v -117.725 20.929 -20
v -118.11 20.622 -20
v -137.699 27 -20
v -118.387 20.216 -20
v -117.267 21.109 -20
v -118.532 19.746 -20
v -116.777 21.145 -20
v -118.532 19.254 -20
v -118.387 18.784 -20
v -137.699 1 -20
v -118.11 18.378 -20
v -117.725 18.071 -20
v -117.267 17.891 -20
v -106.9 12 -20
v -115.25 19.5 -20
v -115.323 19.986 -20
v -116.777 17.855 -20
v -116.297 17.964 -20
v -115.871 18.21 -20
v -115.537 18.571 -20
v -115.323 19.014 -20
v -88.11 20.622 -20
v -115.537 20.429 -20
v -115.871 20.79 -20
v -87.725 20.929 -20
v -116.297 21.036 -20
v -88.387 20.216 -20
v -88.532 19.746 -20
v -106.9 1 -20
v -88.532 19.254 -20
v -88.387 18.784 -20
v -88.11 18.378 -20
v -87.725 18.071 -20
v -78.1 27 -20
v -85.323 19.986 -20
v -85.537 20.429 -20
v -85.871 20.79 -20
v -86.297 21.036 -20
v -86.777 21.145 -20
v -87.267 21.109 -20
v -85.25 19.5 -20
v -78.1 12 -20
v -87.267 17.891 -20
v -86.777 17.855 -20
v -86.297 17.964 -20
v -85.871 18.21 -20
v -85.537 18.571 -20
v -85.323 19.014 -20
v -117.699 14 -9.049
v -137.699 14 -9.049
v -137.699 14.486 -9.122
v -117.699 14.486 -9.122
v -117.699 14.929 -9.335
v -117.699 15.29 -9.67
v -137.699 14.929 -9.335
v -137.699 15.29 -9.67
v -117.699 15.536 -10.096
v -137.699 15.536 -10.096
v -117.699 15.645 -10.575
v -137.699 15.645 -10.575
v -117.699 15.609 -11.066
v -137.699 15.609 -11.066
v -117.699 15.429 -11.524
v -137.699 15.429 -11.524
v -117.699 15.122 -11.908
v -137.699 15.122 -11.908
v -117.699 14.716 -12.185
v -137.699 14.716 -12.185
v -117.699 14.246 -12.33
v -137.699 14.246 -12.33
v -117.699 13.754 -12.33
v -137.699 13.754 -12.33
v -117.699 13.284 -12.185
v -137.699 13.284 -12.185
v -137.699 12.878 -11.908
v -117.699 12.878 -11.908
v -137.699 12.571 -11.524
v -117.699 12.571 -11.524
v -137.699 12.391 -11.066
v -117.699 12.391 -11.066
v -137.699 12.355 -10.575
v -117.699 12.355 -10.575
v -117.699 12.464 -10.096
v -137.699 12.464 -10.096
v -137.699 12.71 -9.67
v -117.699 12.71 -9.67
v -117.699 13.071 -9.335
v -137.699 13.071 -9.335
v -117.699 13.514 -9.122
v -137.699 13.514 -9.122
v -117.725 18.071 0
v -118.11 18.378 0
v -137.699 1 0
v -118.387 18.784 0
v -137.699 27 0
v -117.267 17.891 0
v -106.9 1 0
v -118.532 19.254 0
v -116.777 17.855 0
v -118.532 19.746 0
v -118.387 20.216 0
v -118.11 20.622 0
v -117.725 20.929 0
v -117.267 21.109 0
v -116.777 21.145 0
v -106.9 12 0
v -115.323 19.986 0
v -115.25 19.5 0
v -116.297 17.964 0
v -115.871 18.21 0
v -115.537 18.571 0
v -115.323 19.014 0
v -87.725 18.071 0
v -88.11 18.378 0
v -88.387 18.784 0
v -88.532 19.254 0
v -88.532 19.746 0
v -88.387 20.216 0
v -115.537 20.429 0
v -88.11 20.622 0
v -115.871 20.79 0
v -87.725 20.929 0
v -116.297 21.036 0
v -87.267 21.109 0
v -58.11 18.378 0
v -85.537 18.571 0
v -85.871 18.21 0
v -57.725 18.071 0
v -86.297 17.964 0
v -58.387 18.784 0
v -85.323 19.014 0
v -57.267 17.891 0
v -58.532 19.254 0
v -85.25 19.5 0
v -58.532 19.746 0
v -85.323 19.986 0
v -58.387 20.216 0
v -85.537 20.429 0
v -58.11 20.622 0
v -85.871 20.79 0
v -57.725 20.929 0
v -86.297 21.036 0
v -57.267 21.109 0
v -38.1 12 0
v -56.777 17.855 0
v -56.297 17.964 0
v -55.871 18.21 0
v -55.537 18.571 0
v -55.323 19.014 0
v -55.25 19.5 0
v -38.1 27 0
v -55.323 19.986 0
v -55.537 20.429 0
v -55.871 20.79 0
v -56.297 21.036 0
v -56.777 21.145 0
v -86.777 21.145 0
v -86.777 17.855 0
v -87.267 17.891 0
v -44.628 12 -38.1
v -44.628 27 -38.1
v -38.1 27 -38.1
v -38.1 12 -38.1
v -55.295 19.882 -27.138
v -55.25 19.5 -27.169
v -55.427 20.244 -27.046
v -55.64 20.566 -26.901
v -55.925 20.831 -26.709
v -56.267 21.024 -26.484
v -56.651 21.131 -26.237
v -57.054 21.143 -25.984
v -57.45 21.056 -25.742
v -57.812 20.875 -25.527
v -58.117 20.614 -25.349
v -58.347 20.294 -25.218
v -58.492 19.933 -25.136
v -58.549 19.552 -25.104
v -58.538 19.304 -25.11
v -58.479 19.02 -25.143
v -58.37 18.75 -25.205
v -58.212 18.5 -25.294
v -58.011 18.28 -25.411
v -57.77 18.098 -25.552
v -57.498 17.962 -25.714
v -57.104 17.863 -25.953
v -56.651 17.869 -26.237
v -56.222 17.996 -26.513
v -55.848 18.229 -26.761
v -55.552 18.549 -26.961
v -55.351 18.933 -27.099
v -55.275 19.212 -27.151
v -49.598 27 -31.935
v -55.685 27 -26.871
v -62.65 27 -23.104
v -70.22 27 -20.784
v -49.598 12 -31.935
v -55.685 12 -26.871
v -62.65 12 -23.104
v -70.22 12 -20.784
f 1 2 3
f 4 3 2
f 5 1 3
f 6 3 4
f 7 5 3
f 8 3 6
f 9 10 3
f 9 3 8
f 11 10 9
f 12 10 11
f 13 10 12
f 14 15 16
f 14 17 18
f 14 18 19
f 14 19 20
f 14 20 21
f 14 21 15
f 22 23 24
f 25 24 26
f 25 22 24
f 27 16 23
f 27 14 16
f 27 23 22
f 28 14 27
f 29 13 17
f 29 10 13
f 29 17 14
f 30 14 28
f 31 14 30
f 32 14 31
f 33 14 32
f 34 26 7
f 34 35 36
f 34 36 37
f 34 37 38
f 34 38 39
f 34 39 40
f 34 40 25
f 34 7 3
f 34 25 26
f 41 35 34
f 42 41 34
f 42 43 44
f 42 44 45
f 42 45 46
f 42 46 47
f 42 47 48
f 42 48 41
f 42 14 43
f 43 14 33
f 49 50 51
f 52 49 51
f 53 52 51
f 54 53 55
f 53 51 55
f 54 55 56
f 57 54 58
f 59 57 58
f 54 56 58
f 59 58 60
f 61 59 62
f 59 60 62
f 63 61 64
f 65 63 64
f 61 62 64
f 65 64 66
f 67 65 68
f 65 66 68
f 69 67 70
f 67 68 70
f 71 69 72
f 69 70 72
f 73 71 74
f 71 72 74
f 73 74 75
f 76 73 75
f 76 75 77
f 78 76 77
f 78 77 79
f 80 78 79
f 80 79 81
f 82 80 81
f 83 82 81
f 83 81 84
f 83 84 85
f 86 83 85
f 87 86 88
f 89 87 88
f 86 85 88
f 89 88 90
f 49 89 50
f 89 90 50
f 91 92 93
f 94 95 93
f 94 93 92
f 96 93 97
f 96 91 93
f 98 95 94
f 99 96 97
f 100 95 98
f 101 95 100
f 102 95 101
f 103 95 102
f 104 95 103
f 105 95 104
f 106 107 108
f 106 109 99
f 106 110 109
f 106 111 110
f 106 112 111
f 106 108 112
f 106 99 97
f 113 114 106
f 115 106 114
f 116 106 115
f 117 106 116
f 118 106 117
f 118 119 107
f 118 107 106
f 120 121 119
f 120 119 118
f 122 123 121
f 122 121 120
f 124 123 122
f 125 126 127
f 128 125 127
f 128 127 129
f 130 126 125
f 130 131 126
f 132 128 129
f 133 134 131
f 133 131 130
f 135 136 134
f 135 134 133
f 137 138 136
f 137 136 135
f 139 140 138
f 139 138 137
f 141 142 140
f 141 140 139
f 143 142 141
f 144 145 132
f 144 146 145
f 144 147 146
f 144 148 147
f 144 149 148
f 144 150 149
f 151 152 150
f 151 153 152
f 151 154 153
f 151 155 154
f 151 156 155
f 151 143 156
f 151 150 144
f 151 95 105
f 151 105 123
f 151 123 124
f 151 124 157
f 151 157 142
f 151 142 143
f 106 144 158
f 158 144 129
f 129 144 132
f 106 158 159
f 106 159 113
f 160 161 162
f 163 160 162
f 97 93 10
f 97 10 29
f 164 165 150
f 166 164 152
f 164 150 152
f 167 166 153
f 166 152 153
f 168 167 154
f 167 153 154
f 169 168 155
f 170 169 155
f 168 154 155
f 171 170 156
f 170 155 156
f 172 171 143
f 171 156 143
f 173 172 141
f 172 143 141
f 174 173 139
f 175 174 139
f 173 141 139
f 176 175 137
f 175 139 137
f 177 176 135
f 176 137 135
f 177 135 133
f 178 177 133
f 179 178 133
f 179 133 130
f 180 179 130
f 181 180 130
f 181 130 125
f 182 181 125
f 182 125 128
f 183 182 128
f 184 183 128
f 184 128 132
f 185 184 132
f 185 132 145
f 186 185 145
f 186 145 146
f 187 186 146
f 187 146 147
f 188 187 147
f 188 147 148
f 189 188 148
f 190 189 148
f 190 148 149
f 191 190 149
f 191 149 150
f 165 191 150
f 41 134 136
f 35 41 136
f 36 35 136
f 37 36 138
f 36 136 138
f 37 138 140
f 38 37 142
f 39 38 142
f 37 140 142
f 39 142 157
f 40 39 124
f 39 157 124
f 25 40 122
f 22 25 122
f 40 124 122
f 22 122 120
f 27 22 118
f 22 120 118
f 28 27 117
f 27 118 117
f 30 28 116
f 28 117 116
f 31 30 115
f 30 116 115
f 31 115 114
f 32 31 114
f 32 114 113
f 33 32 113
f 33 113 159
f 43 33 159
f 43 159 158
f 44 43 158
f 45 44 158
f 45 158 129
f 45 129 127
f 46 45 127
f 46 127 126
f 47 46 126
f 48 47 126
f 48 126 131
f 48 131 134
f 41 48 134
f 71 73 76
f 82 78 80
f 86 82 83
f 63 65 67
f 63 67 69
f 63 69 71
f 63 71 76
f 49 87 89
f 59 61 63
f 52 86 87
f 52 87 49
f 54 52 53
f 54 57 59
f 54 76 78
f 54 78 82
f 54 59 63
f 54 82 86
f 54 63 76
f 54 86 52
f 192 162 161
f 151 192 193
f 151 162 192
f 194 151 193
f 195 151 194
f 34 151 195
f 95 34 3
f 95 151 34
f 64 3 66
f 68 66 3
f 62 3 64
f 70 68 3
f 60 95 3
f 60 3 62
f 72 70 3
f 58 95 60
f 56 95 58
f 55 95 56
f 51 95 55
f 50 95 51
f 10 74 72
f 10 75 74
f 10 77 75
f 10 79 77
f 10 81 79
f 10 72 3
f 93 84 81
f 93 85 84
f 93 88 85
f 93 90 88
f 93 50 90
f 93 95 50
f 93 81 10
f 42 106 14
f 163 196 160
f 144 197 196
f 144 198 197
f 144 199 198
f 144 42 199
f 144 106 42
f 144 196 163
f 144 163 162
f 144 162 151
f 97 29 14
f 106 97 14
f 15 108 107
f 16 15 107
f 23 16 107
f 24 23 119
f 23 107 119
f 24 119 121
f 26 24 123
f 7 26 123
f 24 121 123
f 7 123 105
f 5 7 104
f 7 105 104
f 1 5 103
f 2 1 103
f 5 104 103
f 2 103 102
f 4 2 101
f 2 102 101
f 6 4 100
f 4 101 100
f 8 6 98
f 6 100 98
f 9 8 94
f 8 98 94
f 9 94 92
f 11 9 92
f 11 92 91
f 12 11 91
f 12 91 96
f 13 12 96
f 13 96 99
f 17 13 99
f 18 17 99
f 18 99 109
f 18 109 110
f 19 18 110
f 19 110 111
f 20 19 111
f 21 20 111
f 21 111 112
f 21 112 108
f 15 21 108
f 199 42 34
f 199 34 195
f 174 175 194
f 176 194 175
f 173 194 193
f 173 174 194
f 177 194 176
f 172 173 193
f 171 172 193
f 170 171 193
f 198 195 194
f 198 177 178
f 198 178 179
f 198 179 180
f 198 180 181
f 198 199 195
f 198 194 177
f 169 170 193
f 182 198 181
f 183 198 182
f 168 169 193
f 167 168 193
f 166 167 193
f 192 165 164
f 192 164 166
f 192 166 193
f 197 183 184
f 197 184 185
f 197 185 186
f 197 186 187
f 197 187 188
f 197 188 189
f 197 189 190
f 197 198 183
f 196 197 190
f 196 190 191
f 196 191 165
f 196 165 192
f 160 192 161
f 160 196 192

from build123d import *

# Parameters (mm, degrees)
SKETCH1_R               = 1.65
BOSS_EXTRUDE1_DEPTH     = 38.1
SKETCH3_R               = 1.65
CUT_EXTRUDE1_DEPTH      = 20
CUT_EXTRUDE3_DEPTH      = 146.219699553
CUT_EXTRUDE3_DEPTH_BACK = 146.219699553


with BuildPart() as part:
    # Sketch1 → Boss-Extrude1 (new body)
    with BuildSketch(Plane.XY):
        Polygon((-7.90964601, 27), (-137.699495781, 27), (-137.699495781, 1), (-106.9, 1), (-106.9, 12), (-7.90964601, 12), align=None)
        with Locations((-116.9, 19.5)):
            Circle(SKETCH1_R, mode=Mode.SUBTRACT)
        with Locations((-86.9, 19.5)):
            Circle(SKETCH1_R, mode=Mode.SUBTRACT)
        with Locations((-56.9, 19.5)):
            Circle(SKETCH1_R, mode=Mode.SUBTRACT)
        with Locations((-26.9, 19.5)):
            Circle(SKETCH1_R, mode=Mode.SUBTRACT)
    extrude(amount=-BOSS_EXTRUDE1_DEPTH)

    # Sketch3 → Cut-Extrude1 (cut)
    with BuildSketch(Plane.ZY.offset(137.699495781)):
        with Locations((-10.698507709, 14)):
            Circle(SKETCH3_R)
    extrude(amount=-CUT_EXTRUDE1_DEPTH, mode=Mode.SUBTRACT)

    # Sketch4 → Cut-Extrude3 (cut, two sides: drawn at the far end of the back side and taken through both)
    with BuildSketch(Plane(origin=(0, 27, 0), x_dir=(1, 0, 0), z_dir=(0, 1, 0)).offset(-CUT_EXTRUDE3_DEPTH_BACK)):
        with BuildLine():
            ThreePointArc((-78.1, 20), (-59.07370241, 24.814775828), (-44.627772706, 38.1))
            Line((-44.627772706, 38.1), (-137.699495781, 38.1))
            Line((-137.699495781, 38.1), (-137.699495781, 20))
            Line((-137.699495781, 20), (-106.9, 20))
            Line((-106.9, 20), (-78.1, 20))
        make_face()
        Polygon((-38.1, 32.773477062), (-38.1, 28.046305235), (-38.1, 0), (-7.90964601, 0), (-7.90964601, 38.1), (-38.1, 38.1), align=None)
    extrude(amount=CUT_EXTRUDE3_DEPTH + CUT_EXTRUDE3_DEPTH_BACK, mode=Mode.SUBTRACT)


solid = part.part
